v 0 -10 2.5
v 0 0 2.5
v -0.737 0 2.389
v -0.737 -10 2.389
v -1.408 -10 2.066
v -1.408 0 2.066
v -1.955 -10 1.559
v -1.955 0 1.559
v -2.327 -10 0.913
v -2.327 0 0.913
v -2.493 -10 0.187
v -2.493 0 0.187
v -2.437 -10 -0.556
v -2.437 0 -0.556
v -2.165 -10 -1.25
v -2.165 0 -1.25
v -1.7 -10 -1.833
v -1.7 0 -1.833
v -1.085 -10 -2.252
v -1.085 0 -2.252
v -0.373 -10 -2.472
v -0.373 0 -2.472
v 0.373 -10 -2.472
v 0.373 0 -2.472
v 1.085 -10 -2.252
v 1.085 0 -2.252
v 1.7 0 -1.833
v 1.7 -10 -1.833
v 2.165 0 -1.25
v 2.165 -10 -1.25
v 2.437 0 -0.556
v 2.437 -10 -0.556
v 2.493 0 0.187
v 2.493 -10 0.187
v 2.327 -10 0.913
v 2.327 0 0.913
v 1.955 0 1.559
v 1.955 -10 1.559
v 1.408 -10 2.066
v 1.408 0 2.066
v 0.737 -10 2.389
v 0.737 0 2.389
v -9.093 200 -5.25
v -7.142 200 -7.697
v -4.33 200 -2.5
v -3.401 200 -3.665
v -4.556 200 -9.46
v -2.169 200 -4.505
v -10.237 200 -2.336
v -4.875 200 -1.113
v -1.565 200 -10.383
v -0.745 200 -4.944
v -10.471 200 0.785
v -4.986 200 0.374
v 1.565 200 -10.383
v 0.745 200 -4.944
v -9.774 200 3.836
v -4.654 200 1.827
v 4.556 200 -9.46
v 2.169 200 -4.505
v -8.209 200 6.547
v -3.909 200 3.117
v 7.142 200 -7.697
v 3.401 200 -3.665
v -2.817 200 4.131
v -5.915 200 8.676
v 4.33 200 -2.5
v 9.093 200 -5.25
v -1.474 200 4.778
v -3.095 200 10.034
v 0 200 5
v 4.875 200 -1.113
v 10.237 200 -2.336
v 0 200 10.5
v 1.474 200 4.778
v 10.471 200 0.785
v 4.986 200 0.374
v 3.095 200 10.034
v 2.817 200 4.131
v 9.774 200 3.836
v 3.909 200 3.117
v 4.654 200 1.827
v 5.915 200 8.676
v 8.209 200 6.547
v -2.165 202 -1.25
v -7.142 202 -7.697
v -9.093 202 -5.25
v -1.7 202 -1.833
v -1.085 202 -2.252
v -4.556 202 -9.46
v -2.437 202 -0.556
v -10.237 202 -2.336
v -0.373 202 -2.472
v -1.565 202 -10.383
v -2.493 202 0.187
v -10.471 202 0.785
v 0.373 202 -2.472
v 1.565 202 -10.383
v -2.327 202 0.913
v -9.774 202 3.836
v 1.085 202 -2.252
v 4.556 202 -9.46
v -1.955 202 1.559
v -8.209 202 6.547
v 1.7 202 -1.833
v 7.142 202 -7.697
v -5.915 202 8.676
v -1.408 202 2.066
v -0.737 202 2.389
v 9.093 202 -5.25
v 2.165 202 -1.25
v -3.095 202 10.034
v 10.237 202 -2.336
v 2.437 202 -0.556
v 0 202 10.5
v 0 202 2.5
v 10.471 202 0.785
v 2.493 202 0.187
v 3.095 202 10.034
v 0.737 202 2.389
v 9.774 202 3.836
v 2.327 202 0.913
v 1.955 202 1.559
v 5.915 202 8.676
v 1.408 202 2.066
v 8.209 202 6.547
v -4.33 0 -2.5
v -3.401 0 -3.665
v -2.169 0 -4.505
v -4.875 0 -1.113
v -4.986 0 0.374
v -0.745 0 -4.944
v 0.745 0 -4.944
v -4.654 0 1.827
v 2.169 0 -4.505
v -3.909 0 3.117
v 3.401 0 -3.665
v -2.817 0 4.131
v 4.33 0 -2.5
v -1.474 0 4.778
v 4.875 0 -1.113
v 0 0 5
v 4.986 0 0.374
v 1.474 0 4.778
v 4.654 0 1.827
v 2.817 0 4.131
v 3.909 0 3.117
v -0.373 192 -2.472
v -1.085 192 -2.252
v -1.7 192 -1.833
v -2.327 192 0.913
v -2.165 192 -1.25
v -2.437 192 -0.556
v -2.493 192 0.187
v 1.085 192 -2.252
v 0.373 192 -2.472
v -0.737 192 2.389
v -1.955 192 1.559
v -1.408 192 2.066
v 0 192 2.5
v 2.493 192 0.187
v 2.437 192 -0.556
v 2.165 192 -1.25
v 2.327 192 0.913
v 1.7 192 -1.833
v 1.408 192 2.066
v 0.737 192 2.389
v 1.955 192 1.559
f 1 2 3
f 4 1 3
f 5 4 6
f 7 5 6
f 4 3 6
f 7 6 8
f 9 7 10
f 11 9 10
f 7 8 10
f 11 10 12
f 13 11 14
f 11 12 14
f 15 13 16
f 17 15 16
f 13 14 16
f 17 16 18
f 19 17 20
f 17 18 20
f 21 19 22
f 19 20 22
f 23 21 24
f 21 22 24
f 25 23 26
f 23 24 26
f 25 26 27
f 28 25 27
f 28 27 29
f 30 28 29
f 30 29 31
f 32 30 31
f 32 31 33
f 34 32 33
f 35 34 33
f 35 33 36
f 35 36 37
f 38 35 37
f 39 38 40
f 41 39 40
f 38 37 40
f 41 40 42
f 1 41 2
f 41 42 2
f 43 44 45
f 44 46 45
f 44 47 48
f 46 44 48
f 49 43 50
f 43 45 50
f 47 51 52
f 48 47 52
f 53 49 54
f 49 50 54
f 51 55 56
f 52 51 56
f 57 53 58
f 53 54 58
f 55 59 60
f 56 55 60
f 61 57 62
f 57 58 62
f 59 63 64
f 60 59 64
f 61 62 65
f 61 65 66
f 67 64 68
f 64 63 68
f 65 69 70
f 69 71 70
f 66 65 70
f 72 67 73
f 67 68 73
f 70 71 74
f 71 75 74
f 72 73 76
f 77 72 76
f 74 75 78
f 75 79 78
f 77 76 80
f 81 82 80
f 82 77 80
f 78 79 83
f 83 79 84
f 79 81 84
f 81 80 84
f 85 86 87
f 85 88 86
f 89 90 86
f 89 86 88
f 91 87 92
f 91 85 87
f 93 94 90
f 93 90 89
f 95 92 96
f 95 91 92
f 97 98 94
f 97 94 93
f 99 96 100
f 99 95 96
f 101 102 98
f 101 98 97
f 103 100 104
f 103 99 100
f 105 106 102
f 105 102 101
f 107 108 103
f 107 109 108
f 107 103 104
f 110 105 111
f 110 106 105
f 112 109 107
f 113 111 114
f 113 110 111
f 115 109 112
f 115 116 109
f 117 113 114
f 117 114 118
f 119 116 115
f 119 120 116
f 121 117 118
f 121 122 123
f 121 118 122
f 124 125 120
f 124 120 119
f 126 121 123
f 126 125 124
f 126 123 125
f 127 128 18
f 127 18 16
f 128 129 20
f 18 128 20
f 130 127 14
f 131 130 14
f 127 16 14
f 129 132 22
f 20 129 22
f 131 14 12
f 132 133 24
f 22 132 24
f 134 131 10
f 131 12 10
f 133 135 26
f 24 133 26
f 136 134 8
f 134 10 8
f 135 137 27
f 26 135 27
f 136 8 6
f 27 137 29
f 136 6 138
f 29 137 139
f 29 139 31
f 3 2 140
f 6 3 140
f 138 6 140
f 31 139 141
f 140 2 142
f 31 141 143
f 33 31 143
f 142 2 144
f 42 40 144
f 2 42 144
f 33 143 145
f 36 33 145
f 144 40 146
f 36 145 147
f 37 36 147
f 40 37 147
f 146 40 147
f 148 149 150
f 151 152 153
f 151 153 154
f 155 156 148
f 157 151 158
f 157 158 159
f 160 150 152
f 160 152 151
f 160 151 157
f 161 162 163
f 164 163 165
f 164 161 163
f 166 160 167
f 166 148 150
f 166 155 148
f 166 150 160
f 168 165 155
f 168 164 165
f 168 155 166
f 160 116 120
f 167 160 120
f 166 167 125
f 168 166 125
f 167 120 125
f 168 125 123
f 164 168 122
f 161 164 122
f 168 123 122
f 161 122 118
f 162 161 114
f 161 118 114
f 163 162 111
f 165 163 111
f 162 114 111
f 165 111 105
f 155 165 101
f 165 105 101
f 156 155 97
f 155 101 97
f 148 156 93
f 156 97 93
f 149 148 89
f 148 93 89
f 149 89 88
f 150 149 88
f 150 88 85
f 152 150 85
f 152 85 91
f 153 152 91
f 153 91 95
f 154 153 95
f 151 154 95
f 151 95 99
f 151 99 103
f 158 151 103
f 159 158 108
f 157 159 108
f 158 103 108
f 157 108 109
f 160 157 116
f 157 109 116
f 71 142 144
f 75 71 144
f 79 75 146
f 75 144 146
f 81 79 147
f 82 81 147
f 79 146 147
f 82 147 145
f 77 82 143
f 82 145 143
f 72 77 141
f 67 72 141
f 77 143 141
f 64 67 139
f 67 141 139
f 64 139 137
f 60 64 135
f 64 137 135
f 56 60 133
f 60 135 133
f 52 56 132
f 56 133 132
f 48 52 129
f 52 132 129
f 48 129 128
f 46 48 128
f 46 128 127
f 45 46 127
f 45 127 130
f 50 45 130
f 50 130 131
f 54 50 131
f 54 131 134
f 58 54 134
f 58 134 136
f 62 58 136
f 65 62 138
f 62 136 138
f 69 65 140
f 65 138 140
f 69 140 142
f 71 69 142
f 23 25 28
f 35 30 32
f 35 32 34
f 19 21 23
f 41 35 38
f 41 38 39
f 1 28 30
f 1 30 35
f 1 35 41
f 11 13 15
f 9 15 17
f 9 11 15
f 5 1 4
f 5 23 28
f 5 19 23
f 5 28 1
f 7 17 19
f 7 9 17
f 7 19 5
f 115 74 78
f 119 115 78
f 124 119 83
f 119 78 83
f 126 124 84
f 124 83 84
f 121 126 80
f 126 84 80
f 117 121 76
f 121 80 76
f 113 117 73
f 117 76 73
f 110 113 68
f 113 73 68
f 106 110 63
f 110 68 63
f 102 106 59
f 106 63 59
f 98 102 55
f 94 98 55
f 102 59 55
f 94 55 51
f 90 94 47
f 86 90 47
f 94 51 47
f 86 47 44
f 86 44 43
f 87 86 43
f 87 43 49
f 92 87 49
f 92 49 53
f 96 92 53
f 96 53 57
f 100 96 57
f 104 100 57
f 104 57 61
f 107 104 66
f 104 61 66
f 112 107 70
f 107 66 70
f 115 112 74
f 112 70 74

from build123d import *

# Parameters (mm, degrees)
SKETCH2_R           = 5
BOSS_EXTRUDE1_DEPTH = 200
SKETCH3_R           = 10.5
BOSS_EXTRUDE2_DEPTH = 2
SKETCH4_R           = 2.5
CUT_EXTRUDE1_DEPTH  = 10
SKETCH5_R           = 2.5
BOSS_EXTRUDE3_DEPTH = 10


with BuildPart() as part:
    # Sketch2 → Boss-Extrude1 (new body)
    with BuildSketch(Plane(origin=(0, 0, 0), x_dir=(1, 0, 0), z_dir=(0, 1, 0))):
        with Locations(Location((0, 0, 0), (0, 0, 270))):
            Circle(SKETCH2_R)
    extrude(amount=BOSS_EXTRUDE1_DEPTH)

    # Sketch3 → Boss-Extrude2 (add)
    with BuildSketch(Plane(origin=(0, 200, 0), x_dir=(1, 0, 0), z_dir=(0, 1, 0))):
        with Locations(Location((0, 0, 0), (0, 0, 270))):
            Circle(SKETCH3_R)
    extrude(amount=BOSS_EXTRUDE2_DEPTH)

    # Sketch4 → Cut-Extrude1 (cut)
    with BuildSketch(Plane(origin=(0, 202, 0), x_dir=(1, 0, 0), z_dir=(0, 1, 0))):
        with Locations(Location((0, 0, 0), (0, 0, 270))):
            Circle(SKETCH4_R)
    extrude(amount=-CUT_EXTRUDE1_DEPTH, mode=Mode.SUBTRACT)

    # Sketch5 → Boss-Extrude3 (add)
    with BuildSketch(Plane.XZ):
        with Locations(Location((0, 0, 0), (0, 0, 90))):
            Circle(SKETCH5_R)
    extrude(amount=BOSS_EXTRUDE3_DEPTH)


solid = part.part
